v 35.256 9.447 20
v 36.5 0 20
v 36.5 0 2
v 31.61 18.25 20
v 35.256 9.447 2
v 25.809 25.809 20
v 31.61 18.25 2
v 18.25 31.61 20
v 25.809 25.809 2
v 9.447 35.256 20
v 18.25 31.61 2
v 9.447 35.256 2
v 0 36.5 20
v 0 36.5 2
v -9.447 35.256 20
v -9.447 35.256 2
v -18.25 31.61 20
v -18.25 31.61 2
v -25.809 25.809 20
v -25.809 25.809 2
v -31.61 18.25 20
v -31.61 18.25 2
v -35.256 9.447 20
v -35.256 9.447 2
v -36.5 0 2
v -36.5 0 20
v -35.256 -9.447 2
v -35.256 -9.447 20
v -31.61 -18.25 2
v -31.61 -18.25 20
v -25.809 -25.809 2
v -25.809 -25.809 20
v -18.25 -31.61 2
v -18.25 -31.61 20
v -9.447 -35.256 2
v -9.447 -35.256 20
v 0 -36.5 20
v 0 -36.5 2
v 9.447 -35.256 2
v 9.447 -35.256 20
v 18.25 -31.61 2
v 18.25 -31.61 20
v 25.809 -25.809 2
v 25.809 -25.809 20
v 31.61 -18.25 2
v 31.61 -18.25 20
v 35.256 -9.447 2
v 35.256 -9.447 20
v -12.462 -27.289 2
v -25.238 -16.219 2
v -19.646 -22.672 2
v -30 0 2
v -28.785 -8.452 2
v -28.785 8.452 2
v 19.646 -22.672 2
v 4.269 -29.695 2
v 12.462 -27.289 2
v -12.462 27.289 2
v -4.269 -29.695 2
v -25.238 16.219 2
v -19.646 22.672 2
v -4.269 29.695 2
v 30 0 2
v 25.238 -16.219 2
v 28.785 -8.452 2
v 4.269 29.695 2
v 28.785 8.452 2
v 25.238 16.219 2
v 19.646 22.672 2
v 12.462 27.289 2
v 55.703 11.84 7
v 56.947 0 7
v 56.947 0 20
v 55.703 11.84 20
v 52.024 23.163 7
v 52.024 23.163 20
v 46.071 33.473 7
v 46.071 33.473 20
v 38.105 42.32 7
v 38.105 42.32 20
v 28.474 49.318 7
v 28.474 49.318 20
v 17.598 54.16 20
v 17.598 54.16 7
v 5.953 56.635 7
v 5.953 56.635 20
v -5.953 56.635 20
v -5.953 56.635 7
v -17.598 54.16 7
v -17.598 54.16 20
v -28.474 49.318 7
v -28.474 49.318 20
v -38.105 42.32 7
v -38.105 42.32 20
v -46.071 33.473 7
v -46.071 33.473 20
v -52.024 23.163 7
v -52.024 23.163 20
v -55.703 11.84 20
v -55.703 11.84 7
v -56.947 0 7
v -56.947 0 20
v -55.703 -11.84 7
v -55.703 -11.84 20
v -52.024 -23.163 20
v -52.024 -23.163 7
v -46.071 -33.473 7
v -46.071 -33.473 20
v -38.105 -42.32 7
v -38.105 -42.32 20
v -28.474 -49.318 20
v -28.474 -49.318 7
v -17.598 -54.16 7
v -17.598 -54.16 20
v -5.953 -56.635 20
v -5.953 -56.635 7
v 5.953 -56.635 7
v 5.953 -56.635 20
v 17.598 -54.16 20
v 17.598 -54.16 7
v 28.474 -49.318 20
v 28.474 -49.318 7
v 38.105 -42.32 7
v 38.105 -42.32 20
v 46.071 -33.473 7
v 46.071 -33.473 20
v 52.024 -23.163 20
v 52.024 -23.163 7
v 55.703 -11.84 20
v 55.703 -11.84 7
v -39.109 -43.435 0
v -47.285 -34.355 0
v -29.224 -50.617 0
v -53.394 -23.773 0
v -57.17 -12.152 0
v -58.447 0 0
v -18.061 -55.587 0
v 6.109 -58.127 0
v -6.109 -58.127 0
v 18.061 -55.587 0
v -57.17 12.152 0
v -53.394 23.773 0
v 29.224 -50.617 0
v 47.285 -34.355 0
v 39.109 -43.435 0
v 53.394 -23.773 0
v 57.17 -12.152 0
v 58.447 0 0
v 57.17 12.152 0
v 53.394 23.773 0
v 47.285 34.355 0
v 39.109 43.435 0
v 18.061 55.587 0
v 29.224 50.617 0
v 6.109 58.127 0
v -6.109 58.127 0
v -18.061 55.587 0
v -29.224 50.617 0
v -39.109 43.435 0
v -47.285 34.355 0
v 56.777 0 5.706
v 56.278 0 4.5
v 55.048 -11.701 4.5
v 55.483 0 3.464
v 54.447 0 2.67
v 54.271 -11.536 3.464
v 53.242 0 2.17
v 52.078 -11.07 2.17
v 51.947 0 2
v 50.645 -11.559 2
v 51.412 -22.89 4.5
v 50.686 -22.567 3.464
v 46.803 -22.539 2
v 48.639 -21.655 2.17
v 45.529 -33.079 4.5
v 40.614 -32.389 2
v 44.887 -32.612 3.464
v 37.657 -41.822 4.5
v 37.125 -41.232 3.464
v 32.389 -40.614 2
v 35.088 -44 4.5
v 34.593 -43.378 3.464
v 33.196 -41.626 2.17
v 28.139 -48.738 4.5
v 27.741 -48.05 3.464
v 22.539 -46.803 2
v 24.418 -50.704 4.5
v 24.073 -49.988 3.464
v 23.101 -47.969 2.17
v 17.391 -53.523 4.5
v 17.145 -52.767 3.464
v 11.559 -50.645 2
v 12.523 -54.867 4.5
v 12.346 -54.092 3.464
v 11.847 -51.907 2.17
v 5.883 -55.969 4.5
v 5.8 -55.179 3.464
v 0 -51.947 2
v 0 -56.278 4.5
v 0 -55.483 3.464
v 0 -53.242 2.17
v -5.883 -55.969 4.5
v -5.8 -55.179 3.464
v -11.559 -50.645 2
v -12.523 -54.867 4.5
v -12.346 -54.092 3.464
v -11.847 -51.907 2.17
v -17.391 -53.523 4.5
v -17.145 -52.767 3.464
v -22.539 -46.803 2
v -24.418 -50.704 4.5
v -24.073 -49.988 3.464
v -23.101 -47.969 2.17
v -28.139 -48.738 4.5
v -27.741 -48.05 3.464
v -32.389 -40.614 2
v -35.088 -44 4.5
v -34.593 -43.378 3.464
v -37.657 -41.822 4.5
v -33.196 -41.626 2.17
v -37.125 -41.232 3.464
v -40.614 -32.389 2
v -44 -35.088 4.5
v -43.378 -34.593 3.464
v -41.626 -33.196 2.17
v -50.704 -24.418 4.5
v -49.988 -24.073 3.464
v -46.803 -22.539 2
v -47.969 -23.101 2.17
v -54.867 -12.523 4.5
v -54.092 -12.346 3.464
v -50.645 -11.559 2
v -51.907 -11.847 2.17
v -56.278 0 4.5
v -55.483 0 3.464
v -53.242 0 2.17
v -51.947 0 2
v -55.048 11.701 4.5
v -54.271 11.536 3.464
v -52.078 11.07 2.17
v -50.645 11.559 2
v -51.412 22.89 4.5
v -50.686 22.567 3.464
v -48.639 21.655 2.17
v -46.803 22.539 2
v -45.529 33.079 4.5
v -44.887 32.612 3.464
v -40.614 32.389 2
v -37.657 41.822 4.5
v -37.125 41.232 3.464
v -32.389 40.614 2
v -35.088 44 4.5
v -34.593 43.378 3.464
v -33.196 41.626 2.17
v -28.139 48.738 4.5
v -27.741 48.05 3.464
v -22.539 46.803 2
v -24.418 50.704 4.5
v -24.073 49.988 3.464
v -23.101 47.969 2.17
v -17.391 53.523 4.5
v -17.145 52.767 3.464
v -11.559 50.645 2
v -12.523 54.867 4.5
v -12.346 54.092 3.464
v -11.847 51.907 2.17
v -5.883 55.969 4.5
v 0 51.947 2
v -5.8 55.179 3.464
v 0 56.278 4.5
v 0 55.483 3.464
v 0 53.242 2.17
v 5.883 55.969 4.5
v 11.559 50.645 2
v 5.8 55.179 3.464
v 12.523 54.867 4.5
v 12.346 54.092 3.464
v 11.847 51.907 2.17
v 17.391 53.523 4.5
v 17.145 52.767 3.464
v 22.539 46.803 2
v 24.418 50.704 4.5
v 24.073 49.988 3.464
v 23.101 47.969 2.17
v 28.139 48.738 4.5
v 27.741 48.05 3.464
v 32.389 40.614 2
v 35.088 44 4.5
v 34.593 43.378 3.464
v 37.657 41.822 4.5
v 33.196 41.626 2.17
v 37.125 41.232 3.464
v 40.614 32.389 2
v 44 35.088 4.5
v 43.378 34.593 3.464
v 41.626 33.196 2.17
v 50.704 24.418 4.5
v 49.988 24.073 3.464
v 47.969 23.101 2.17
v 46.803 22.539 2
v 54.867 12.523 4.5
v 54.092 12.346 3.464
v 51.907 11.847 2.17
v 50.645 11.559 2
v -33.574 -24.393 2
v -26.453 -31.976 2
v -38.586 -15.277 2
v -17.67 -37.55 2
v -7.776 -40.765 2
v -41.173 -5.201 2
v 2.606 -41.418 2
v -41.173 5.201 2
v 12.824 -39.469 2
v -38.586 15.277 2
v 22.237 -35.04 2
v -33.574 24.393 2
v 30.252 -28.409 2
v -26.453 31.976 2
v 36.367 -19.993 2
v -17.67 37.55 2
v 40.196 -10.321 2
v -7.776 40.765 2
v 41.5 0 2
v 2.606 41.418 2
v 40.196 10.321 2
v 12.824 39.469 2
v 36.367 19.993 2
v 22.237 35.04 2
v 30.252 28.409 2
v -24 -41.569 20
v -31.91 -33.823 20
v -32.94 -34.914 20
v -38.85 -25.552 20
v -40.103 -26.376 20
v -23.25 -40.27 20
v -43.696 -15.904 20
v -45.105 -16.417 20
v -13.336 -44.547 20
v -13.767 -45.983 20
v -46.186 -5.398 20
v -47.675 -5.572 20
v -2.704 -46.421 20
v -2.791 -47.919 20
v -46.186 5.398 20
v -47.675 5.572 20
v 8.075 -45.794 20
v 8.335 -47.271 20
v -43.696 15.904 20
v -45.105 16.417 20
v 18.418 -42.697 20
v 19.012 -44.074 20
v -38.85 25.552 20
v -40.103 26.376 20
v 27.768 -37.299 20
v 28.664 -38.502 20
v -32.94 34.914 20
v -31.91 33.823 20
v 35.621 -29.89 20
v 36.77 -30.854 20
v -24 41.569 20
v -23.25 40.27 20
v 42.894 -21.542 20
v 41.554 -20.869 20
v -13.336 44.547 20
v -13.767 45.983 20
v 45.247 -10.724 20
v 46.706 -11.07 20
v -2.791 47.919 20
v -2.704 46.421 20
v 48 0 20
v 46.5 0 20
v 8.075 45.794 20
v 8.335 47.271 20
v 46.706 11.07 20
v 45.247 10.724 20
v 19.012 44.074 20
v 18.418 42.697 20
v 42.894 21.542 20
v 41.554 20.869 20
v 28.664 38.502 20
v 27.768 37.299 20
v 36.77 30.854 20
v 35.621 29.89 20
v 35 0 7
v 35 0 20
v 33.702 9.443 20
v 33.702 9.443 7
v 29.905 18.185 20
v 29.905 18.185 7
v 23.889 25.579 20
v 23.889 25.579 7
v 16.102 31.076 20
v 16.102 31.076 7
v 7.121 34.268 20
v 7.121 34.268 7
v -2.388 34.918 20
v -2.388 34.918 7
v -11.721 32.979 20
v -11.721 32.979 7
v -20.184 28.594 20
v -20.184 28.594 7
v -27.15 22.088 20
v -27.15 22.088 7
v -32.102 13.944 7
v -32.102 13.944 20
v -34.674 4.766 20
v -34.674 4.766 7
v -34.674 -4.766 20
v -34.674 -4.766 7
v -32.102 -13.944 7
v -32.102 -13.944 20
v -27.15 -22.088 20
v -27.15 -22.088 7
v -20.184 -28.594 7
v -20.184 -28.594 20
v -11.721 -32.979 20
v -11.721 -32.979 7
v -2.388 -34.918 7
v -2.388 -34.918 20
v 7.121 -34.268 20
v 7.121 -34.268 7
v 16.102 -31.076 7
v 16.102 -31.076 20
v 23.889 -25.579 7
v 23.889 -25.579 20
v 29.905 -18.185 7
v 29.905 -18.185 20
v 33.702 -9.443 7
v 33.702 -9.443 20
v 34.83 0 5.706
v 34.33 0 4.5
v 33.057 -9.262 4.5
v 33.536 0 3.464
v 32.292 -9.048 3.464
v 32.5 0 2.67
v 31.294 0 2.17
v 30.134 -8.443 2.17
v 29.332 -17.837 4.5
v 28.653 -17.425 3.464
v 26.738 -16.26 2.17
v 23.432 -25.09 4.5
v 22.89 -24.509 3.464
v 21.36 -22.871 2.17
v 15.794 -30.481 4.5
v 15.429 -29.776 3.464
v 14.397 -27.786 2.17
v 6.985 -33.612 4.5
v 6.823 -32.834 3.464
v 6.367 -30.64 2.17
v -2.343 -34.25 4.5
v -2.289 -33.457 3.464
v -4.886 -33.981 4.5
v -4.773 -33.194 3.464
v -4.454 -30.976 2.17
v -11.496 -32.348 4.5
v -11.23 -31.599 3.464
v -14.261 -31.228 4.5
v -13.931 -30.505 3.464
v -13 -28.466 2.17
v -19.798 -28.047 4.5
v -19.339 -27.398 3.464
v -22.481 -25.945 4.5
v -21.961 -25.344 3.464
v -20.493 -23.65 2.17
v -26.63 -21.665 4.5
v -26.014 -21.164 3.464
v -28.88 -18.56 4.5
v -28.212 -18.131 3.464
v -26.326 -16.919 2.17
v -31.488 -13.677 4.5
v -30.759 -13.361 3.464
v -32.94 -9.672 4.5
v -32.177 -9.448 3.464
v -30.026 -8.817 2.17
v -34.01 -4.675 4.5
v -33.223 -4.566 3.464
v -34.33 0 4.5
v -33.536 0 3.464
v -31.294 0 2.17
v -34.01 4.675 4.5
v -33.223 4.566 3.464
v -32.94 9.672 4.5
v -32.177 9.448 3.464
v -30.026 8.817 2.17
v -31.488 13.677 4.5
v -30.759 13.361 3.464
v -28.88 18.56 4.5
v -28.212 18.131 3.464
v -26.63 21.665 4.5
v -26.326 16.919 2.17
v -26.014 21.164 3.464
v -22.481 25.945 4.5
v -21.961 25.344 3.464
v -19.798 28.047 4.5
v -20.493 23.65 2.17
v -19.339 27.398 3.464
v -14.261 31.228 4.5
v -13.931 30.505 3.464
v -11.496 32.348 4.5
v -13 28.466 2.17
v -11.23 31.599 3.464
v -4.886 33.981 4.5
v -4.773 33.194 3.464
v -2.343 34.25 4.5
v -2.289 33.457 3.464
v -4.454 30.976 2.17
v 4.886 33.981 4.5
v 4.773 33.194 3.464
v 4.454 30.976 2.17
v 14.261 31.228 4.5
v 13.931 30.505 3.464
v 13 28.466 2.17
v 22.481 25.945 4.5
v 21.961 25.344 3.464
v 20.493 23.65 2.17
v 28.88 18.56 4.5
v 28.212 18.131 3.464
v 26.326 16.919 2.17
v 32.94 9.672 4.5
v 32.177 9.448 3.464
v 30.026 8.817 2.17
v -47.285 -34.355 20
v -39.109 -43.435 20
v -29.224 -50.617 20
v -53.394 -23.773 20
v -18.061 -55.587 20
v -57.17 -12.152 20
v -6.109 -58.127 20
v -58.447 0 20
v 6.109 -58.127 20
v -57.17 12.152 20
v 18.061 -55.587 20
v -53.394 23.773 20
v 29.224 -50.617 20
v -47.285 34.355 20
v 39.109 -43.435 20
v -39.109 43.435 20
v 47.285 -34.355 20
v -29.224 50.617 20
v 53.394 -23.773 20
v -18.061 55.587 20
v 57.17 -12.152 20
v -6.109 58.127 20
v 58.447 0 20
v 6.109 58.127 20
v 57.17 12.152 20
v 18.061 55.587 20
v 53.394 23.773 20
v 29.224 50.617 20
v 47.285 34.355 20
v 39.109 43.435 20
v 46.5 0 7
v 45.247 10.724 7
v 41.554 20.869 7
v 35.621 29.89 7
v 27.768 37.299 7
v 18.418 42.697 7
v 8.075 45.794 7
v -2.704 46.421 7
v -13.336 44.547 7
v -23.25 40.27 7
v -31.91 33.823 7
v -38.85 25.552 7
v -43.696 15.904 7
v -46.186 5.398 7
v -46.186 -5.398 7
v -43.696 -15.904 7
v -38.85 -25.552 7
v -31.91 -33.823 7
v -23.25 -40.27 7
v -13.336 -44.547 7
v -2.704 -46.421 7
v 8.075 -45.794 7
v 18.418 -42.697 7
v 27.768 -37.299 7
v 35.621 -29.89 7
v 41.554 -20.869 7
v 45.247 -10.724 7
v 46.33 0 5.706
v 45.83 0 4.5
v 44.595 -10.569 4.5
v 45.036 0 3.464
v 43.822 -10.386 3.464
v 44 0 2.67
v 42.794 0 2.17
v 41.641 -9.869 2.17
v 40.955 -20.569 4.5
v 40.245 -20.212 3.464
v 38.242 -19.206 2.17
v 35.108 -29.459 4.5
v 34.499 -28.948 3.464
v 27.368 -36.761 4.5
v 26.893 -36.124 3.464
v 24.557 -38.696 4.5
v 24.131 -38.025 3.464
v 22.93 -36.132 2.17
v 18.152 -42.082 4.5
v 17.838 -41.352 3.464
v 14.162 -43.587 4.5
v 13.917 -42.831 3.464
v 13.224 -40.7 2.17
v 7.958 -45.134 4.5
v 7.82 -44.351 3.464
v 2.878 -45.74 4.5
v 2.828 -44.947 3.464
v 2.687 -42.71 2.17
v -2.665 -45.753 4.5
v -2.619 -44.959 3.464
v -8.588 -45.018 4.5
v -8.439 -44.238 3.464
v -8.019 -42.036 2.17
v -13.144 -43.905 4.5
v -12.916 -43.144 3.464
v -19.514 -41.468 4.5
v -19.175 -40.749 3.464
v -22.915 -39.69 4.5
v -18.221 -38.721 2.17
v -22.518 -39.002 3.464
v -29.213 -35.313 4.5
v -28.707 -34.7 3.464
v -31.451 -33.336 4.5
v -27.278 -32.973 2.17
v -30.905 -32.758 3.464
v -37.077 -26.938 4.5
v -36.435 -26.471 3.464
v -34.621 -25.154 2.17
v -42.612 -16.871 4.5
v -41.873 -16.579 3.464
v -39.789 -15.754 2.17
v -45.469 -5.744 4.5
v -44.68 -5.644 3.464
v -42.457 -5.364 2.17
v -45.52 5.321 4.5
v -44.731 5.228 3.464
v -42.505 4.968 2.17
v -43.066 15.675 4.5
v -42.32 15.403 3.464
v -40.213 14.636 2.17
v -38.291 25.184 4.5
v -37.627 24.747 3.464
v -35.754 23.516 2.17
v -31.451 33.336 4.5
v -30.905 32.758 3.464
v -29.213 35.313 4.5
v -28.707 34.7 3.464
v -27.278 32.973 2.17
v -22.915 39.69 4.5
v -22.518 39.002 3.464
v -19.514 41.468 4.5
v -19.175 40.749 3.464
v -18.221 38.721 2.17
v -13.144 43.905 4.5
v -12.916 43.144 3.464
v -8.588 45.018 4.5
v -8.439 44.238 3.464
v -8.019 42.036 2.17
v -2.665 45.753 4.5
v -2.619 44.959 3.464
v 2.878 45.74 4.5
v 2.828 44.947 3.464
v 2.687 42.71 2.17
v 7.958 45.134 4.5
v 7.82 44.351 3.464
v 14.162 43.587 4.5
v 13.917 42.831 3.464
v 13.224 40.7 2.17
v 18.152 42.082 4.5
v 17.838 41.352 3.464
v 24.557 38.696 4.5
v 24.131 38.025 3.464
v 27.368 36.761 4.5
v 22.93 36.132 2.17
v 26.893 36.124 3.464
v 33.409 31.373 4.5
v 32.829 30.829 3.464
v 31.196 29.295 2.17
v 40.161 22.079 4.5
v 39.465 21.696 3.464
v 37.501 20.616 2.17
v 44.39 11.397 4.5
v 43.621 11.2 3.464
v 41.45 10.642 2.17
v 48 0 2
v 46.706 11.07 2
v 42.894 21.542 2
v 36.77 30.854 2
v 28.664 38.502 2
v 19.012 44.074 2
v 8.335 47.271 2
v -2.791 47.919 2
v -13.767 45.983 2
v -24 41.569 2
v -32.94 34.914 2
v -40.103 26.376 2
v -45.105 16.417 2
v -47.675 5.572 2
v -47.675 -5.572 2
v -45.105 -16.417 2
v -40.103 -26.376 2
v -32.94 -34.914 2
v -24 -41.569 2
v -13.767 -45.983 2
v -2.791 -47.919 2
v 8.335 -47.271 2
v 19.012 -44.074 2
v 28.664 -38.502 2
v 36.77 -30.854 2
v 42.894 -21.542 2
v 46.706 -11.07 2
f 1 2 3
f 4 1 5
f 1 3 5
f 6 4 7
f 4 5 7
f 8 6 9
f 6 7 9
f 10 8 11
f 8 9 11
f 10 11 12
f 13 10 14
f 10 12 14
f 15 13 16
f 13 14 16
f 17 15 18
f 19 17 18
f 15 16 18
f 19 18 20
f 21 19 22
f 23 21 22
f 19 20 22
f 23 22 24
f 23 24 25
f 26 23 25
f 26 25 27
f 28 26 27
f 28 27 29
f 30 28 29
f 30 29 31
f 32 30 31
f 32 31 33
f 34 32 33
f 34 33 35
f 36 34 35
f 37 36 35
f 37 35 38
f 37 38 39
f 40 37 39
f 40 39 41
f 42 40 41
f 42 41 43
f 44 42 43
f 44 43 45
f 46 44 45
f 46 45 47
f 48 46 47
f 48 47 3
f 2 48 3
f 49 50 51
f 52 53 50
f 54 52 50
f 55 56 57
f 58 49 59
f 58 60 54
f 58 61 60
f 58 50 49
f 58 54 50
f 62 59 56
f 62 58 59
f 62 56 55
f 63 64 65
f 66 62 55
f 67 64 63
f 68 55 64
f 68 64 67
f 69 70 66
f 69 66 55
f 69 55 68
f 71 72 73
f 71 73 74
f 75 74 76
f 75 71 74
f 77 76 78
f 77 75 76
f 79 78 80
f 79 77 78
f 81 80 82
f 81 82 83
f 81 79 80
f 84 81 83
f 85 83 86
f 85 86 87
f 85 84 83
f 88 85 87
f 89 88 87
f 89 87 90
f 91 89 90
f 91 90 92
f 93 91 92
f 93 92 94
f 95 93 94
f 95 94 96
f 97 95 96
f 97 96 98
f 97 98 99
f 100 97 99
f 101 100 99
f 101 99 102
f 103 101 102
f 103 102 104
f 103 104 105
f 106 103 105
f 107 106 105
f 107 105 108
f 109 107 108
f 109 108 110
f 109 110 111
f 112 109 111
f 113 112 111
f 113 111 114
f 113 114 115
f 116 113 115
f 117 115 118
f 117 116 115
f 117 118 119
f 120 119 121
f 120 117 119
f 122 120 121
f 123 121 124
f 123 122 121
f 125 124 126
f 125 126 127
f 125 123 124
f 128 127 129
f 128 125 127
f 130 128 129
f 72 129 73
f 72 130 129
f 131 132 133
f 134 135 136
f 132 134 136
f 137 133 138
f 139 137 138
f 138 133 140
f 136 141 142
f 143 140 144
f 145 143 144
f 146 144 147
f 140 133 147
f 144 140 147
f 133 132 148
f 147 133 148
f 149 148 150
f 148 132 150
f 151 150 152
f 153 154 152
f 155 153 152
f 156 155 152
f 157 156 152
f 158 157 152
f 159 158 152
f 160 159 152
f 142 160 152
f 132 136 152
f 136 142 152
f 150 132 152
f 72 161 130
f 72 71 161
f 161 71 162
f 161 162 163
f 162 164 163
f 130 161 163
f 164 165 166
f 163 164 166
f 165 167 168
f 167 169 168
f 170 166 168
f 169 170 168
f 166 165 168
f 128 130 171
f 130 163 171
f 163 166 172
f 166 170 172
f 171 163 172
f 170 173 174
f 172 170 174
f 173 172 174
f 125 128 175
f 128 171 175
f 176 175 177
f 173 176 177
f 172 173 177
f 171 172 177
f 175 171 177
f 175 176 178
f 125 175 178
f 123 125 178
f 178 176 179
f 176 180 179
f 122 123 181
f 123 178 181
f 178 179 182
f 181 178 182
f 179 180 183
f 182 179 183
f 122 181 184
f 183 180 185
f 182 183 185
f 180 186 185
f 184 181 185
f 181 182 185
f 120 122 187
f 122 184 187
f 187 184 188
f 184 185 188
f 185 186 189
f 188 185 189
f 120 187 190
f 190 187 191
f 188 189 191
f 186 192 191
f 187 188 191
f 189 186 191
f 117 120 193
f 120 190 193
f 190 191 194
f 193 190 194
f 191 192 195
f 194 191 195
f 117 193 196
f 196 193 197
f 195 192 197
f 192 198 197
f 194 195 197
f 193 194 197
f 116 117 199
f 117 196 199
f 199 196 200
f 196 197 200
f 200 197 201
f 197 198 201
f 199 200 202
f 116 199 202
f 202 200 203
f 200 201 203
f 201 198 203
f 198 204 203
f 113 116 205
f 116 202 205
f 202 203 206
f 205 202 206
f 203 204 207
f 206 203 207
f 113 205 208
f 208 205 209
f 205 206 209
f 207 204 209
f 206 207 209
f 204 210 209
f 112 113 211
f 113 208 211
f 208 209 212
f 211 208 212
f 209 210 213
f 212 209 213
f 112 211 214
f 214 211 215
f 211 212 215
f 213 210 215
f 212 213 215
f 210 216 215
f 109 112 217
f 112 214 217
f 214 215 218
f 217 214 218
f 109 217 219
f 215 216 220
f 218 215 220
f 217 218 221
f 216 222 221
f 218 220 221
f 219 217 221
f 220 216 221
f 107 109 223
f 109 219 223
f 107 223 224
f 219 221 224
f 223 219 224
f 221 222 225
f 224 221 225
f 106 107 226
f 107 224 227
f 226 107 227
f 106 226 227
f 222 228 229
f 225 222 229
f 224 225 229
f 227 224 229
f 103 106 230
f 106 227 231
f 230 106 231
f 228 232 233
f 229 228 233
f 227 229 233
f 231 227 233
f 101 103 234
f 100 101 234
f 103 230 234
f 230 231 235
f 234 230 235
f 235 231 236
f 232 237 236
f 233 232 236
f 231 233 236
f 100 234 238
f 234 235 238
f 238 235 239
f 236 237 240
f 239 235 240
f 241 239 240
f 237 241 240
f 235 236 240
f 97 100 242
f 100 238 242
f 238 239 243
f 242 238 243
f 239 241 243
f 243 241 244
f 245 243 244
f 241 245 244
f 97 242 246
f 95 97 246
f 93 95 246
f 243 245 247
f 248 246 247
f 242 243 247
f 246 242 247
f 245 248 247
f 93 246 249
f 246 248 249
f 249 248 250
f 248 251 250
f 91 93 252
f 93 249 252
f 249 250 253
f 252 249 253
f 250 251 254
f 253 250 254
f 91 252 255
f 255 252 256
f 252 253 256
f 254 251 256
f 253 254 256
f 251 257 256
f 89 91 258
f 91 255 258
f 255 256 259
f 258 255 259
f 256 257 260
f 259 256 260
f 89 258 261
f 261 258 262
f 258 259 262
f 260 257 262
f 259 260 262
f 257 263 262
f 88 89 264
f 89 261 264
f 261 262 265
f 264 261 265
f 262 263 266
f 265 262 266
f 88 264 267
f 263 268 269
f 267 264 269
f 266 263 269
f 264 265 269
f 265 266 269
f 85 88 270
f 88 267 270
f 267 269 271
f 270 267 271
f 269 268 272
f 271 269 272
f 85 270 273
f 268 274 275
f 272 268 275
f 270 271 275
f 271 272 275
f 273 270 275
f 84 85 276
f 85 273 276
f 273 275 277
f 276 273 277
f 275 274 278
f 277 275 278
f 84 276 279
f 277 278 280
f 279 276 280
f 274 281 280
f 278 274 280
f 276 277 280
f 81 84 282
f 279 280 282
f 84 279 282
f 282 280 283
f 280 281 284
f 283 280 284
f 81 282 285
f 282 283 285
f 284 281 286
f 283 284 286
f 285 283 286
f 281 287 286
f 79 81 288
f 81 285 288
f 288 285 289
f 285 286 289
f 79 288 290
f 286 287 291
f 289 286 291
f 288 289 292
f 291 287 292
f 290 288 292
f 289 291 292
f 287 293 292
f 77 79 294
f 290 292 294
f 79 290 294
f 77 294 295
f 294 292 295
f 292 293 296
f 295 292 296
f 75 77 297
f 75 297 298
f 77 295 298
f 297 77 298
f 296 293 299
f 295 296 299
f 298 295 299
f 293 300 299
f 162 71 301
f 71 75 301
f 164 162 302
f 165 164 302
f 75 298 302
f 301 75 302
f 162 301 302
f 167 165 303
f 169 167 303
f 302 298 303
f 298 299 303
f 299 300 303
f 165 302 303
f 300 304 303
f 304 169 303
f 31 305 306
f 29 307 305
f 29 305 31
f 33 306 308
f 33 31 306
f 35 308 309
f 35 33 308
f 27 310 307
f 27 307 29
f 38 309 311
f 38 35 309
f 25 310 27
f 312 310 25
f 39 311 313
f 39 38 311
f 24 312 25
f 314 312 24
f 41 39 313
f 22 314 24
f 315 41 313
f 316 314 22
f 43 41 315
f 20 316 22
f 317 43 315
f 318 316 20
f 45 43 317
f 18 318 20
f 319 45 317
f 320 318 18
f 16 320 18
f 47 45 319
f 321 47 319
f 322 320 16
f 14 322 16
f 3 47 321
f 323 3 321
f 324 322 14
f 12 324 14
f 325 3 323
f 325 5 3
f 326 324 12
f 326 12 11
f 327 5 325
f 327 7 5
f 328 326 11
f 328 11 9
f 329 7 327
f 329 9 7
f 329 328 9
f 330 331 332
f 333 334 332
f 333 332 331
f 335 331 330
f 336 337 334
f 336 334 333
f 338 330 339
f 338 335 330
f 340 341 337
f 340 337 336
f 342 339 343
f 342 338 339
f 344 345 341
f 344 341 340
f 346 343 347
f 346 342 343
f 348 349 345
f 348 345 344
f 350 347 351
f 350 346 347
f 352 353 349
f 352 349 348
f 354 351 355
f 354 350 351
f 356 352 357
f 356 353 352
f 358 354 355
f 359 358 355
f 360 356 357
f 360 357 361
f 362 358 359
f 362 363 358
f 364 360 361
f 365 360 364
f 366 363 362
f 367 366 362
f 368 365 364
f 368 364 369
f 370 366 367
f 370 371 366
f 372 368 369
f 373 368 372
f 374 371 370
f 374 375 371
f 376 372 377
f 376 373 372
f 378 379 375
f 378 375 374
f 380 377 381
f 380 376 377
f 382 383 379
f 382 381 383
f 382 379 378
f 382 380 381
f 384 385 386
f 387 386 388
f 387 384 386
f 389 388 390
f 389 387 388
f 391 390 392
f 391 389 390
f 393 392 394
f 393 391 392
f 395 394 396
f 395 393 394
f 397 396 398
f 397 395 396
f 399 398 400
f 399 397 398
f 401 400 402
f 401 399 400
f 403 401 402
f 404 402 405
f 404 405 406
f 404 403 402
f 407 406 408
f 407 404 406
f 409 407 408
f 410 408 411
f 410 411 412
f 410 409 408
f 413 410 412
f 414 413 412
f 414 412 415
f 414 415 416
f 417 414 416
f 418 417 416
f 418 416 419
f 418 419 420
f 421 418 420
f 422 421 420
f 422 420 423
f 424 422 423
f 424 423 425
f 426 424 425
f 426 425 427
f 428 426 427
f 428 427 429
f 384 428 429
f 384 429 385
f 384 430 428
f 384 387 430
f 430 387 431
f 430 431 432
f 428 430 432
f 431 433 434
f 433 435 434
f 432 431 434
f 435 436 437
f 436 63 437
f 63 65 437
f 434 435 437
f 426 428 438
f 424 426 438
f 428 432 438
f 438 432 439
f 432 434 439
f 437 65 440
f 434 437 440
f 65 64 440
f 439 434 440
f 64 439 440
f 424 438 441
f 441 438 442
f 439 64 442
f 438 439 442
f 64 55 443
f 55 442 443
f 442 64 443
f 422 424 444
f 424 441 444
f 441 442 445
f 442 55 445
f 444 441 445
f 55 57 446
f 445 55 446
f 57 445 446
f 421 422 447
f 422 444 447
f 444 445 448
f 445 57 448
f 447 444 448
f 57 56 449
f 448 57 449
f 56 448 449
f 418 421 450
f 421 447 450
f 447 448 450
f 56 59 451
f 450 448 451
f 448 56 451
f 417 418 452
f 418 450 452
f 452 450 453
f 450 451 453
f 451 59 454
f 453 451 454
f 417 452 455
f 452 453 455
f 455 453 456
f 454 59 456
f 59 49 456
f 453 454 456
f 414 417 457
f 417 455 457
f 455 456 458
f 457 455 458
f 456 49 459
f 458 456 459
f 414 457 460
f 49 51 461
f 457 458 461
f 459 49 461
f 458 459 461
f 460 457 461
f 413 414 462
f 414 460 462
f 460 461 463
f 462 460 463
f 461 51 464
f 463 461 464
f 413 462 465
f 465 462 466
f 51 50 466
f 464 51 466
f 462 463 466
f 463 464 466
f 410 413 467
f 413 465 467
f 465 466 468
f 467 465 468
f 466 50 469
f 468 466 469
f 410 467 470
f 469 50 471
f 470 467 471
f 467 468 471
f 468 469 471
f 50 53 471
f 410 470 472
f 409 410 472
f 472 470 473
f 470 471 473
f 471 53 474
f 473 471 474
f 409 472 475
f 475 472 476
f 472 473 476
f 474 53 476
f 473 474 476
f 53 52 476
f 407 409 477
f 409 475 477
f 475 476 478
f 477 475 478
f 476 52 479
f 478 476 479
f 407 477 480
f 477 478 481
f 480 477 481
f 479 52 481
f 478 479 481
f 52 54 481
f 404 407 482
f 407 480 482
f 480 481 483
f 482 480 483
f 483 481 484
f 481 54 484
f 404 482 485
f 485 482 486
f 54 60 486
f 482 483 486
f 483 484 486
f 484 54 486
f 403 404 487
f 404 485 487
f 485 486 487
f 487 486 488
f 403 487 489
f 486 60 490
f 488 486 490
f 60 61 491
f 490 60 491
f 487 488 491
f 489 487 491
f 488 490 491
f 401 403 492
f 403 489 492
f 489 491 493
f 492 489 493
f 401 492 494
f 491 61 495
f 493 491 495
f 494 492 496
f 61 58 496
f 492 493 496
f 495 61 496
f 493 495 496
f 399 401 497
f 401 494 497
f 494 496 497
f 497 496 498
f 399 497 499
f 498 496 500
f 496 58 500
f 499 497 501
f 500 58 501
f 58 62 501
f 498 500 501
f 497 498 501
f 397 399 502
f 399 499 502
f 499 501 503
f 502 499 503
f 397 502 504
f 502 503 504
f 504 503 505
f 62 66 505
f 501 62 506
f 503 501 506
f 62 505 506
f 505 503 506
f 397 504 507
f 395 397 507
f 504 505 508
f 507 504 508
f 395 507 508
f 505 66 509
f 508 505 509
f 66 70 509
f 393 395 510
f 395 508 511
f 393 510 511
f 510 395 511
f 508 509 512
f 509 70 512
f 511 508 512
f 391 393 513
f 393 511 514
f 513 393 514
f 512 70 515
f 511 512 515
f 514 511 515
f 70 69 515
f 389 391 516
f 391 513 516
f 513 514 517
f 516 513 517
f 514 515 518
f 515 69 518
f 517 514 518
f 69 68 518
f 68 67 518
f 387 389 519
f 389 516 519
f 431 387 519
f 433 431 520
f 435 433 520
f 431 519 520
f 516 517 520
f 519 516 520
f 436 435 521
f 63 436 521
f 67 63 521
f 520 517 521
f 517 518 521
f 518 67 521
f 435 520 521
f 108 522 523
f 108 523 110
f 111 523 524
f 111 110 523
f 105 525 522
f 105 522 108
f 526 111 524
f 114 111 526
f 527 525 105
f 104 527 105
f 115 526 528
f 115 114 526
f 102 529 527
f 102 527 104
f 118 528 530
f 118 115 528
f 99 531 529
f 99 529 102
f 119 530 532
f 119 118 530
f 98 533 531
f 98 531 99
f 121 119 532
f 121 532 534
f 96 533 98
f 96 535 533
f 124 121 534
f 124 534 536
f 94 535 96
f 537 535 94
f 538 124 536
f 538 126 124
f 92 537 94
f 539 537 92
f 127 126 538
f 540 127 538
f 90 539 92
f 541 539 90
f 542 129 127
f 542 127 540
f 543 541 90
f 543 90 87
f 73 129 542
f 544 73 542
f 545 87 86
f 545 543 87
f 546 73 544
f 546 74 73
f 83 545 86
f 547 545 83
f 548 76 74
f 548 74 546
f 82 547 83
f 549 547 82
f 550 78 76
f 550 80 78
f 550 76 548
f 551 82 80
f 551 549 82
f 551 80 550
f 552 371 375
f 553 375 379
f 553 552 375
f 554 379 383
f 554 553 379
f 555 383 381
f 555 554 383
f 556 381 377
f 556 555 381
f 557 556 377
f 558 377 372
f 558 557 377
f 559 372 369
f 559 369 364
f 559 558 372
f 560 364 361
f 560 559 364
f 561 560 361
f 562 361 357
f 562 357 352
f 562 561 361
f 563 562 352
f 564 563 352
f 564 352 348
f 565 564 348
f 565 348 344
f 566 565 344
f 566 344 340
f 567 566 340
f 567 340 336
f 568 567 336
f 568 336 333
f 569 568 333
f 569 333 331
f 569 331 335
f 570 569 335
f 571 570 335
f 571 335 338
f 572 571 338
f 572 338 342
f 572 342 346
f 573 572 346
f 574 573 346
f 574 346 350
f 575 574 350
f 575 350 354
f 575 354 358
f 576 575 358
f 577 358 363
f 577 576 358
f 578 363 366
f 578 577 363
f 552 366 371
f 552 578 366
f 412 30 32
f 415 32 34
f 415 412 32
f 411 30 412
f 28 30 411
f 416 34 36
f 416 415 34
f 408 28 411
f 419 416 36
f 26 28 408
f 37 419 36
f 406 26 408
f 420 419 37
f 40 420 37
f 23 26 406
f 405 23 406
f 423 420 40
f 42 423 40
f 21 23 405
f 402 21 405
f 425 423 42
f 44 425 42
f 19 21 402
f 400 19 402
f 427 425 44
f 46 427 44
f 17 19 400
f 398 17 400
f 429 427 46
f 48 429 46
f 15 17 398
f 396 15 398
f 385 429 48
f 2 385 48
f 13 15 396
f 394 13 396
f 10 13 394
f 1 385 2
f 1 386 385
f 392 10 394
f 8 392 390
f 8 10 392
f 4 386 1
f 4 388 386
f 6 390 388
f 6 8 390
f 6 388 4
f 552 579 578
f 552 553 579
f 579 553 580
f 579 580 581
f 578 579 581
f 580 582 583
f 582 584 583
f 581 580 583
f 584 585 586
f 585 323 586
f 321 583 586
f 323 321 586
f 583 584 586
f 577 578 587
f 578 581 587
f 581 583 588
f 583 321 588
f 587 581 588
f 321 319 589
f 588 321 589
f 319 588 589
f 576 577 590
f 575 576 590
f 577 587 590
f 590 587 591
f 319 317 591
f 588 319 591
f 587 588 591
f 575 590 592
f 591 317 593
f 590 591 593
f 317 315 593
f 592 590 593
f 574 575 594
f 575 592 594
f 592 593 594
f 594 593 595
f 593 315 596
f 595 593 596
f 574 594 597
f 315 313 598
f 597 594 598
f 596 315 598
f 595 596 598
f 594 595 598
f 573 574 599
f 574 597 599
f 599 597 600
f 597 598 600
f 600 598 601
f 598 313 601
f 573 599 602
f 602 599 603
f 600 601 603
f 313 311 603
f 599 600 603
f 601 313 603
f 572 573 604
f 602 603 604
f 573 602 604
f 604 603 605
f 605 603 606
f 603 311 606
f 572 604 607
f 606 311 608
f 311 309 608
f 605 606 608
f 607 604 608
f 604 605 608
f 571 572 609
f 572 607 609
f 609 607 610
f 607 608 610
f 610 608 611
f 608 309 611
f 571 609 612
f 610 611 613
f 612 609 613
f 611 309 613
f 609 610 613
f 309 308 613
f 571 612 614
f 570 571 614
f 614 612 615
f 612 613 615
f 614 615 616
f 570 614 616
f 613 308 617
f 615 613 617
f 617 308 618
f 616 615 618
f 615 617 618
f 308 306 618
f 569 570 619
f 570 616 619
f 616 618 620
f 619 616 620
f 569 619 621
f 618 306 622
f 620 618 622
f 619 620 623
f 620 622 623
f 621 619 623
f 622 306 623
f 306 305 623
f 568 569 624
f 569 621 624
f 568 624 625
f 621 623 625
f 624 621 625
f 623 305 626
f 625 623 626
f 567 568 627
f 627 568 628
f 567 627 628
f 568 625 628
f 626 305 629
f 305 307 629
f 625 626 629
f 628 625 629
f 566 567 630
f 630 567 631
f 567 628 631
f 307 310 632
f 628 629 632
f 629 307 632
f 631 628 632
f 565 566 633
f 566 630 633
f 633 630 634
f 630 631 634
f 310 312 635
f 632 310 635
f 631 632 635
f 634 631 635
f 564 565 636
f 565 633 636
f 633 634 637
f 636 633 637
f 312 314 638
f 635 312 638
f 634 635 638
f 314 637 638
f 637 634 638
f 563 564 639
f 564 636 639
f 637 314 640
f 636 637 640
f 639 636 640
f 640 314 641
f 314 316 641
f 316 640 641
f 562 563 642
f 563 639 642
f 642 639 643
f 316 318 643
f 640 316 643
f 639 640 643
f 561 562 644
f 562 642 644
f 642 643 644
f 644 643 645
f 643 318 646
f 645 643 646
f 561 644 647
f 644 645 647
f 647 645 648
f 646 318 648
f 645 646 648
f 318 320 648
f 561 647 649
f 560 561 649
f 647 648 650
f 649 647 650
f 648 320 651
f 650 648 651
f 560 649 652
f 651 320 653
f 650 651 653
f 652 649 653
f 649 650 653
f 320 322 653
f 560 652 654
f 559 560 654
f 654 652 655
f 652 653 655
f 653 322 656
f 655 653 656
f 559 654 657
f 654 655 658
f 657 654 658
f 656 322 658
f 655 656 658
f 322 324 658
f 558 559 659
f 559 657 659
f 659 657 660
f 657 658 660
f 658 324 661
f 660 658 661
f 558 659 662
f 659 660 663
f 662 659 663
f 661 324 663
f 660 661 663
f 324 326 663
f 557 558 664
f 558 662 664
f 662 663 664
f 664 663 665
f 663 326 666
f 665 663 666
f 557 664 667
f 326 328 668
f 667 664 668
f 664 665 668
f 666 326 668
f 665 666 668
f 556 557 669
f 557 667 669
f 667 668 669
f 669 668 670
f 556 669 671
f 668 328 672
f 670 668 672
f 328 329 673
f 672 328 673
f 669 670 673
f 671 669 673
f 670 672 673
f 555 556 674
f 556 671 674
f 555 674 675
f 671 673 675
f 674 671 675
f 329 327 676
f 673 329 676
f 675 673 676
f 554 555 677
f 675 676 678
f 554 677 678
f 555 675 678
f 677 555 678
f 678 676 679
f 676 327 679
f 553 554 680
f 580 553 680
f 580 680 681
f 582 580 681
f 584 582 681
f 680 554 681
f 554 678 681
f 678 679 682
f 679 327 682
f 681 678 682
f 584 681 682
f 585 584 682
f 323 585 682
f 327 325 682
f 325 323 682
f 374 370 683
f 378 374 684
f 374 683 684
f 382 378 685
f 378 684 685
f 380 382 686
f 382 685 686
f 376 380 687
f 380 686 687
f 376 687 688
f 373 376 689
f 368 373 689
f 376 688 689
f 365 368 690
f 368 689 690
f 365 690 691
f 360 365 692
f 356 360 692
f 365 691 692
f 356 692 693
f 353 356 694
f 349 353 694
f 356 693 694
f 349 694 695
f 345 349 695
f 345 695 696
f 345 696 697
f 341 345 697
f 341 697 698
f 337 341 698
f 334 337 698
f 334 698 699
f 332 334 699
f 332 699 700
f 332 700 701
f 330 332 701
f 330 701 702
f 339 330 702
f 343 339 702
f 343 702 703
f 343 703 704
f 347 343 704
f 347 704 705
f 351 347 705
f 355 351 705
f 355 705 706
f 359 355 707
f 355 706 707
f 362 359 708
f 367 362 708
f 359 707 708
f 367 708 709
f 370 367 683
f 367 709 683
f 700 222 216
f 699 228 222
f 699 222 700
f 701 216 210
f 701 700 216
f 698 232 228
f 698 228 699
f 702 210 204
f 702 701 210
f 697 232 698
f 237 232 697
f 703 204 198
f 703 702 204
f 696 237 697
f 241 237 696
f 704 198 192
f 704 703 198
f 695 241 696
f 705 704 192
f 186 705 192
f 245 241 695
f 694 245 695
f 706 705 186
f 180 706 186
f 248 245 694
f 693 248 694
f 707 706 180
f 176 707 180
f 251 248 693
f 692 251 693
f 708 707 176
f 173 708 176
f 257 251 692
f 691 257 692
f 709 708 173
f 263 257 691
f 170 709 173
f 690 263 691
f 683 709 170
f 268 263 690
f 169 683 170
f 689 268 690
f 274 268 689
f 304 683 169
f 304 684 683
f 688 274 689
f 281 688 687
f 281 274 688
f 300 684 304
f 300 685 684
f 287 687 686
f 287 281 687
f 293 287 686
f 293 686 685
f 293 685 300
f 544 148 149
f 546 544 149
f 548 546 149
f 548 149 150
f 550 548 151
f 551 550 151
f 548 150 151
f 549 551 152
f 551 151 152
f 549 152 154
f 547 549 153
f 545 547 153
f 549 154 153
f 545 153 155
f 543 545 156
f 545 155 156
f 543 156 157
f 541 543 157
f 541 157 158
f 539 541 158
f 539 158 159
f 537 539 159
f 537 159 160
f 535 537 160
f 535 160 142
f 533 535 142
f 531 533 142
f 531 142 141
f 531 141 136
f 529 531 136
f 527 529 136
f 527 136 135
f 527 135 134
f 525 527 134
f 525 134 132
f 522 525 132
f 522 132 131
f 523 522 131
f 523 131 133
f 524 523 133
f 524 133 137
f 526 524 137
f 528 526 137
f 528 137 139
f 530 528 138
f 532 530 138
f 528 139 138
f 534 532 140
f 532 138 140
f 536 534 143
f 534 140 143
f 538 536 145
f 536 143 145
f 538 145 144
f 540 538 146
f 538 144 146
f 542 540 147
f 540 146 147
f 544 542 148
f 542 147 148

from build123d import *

# Parameters (mm, degrees)
F0_R     = 58.4474221673
F0_R_2   = 56.9474221673
F0_R_3   = 48
F0_R_4   = 46.5
F0_R_5   = 36.5
F0_R_6   = 35
F1_DEPTH = 2
F2_DEPTH = 20
F3_R     = 5


with BuildPart() as f1:
    # F0 (on Top) → F1 (new body)
    with BuildSketch(Plane.XY):
        Circle(F0_R)
        Circle(F0_R_2, mode=Mode.SUBTRACT)
        Circle(F0_R_2)
        Circle(F0_R_3, mode=Mode.SUBTRACT)
        Circle(F0_R_3)
        Circle(F0_R_4, mode=Mode.SUBTRACT)
        Circle(F0_R_4)
        Circle(F0_R_5, mode=Mode.SUBTRACT)
        Circle(F0_R_5)
        Circle(F0_R_6, mode=Mode.SUBTRACT)
        Circle(F0_R_6)
    extrude(amount=F1_DEPTH)

    # F0 (on Top) → F2 (join)
    with BuildSketch(Plane.XY):
        Circle(F0_R)
        Circle(F0_R_2, mode=Mode.SUBTRACT)
        Circle(F0_R_3)
        Circle(F0_R_4, mode=Mode.SUBTRACT)
        Circle(F0_R_5)
        Circle(F0_R_6, mode=Mode.SUBTRACT)
    extrude(amount=F2_DEPTH)

    # F3
    f3_edges = [f1.edges().sort_by_distance(p)[0] for p in [
        (-35, 0, 2),
        (-46.5, 0, 2),
        (-56.947422, 0, 2),
    ]]
    fillet(f3_edges, radius=F3_R)


solid = f1.part
